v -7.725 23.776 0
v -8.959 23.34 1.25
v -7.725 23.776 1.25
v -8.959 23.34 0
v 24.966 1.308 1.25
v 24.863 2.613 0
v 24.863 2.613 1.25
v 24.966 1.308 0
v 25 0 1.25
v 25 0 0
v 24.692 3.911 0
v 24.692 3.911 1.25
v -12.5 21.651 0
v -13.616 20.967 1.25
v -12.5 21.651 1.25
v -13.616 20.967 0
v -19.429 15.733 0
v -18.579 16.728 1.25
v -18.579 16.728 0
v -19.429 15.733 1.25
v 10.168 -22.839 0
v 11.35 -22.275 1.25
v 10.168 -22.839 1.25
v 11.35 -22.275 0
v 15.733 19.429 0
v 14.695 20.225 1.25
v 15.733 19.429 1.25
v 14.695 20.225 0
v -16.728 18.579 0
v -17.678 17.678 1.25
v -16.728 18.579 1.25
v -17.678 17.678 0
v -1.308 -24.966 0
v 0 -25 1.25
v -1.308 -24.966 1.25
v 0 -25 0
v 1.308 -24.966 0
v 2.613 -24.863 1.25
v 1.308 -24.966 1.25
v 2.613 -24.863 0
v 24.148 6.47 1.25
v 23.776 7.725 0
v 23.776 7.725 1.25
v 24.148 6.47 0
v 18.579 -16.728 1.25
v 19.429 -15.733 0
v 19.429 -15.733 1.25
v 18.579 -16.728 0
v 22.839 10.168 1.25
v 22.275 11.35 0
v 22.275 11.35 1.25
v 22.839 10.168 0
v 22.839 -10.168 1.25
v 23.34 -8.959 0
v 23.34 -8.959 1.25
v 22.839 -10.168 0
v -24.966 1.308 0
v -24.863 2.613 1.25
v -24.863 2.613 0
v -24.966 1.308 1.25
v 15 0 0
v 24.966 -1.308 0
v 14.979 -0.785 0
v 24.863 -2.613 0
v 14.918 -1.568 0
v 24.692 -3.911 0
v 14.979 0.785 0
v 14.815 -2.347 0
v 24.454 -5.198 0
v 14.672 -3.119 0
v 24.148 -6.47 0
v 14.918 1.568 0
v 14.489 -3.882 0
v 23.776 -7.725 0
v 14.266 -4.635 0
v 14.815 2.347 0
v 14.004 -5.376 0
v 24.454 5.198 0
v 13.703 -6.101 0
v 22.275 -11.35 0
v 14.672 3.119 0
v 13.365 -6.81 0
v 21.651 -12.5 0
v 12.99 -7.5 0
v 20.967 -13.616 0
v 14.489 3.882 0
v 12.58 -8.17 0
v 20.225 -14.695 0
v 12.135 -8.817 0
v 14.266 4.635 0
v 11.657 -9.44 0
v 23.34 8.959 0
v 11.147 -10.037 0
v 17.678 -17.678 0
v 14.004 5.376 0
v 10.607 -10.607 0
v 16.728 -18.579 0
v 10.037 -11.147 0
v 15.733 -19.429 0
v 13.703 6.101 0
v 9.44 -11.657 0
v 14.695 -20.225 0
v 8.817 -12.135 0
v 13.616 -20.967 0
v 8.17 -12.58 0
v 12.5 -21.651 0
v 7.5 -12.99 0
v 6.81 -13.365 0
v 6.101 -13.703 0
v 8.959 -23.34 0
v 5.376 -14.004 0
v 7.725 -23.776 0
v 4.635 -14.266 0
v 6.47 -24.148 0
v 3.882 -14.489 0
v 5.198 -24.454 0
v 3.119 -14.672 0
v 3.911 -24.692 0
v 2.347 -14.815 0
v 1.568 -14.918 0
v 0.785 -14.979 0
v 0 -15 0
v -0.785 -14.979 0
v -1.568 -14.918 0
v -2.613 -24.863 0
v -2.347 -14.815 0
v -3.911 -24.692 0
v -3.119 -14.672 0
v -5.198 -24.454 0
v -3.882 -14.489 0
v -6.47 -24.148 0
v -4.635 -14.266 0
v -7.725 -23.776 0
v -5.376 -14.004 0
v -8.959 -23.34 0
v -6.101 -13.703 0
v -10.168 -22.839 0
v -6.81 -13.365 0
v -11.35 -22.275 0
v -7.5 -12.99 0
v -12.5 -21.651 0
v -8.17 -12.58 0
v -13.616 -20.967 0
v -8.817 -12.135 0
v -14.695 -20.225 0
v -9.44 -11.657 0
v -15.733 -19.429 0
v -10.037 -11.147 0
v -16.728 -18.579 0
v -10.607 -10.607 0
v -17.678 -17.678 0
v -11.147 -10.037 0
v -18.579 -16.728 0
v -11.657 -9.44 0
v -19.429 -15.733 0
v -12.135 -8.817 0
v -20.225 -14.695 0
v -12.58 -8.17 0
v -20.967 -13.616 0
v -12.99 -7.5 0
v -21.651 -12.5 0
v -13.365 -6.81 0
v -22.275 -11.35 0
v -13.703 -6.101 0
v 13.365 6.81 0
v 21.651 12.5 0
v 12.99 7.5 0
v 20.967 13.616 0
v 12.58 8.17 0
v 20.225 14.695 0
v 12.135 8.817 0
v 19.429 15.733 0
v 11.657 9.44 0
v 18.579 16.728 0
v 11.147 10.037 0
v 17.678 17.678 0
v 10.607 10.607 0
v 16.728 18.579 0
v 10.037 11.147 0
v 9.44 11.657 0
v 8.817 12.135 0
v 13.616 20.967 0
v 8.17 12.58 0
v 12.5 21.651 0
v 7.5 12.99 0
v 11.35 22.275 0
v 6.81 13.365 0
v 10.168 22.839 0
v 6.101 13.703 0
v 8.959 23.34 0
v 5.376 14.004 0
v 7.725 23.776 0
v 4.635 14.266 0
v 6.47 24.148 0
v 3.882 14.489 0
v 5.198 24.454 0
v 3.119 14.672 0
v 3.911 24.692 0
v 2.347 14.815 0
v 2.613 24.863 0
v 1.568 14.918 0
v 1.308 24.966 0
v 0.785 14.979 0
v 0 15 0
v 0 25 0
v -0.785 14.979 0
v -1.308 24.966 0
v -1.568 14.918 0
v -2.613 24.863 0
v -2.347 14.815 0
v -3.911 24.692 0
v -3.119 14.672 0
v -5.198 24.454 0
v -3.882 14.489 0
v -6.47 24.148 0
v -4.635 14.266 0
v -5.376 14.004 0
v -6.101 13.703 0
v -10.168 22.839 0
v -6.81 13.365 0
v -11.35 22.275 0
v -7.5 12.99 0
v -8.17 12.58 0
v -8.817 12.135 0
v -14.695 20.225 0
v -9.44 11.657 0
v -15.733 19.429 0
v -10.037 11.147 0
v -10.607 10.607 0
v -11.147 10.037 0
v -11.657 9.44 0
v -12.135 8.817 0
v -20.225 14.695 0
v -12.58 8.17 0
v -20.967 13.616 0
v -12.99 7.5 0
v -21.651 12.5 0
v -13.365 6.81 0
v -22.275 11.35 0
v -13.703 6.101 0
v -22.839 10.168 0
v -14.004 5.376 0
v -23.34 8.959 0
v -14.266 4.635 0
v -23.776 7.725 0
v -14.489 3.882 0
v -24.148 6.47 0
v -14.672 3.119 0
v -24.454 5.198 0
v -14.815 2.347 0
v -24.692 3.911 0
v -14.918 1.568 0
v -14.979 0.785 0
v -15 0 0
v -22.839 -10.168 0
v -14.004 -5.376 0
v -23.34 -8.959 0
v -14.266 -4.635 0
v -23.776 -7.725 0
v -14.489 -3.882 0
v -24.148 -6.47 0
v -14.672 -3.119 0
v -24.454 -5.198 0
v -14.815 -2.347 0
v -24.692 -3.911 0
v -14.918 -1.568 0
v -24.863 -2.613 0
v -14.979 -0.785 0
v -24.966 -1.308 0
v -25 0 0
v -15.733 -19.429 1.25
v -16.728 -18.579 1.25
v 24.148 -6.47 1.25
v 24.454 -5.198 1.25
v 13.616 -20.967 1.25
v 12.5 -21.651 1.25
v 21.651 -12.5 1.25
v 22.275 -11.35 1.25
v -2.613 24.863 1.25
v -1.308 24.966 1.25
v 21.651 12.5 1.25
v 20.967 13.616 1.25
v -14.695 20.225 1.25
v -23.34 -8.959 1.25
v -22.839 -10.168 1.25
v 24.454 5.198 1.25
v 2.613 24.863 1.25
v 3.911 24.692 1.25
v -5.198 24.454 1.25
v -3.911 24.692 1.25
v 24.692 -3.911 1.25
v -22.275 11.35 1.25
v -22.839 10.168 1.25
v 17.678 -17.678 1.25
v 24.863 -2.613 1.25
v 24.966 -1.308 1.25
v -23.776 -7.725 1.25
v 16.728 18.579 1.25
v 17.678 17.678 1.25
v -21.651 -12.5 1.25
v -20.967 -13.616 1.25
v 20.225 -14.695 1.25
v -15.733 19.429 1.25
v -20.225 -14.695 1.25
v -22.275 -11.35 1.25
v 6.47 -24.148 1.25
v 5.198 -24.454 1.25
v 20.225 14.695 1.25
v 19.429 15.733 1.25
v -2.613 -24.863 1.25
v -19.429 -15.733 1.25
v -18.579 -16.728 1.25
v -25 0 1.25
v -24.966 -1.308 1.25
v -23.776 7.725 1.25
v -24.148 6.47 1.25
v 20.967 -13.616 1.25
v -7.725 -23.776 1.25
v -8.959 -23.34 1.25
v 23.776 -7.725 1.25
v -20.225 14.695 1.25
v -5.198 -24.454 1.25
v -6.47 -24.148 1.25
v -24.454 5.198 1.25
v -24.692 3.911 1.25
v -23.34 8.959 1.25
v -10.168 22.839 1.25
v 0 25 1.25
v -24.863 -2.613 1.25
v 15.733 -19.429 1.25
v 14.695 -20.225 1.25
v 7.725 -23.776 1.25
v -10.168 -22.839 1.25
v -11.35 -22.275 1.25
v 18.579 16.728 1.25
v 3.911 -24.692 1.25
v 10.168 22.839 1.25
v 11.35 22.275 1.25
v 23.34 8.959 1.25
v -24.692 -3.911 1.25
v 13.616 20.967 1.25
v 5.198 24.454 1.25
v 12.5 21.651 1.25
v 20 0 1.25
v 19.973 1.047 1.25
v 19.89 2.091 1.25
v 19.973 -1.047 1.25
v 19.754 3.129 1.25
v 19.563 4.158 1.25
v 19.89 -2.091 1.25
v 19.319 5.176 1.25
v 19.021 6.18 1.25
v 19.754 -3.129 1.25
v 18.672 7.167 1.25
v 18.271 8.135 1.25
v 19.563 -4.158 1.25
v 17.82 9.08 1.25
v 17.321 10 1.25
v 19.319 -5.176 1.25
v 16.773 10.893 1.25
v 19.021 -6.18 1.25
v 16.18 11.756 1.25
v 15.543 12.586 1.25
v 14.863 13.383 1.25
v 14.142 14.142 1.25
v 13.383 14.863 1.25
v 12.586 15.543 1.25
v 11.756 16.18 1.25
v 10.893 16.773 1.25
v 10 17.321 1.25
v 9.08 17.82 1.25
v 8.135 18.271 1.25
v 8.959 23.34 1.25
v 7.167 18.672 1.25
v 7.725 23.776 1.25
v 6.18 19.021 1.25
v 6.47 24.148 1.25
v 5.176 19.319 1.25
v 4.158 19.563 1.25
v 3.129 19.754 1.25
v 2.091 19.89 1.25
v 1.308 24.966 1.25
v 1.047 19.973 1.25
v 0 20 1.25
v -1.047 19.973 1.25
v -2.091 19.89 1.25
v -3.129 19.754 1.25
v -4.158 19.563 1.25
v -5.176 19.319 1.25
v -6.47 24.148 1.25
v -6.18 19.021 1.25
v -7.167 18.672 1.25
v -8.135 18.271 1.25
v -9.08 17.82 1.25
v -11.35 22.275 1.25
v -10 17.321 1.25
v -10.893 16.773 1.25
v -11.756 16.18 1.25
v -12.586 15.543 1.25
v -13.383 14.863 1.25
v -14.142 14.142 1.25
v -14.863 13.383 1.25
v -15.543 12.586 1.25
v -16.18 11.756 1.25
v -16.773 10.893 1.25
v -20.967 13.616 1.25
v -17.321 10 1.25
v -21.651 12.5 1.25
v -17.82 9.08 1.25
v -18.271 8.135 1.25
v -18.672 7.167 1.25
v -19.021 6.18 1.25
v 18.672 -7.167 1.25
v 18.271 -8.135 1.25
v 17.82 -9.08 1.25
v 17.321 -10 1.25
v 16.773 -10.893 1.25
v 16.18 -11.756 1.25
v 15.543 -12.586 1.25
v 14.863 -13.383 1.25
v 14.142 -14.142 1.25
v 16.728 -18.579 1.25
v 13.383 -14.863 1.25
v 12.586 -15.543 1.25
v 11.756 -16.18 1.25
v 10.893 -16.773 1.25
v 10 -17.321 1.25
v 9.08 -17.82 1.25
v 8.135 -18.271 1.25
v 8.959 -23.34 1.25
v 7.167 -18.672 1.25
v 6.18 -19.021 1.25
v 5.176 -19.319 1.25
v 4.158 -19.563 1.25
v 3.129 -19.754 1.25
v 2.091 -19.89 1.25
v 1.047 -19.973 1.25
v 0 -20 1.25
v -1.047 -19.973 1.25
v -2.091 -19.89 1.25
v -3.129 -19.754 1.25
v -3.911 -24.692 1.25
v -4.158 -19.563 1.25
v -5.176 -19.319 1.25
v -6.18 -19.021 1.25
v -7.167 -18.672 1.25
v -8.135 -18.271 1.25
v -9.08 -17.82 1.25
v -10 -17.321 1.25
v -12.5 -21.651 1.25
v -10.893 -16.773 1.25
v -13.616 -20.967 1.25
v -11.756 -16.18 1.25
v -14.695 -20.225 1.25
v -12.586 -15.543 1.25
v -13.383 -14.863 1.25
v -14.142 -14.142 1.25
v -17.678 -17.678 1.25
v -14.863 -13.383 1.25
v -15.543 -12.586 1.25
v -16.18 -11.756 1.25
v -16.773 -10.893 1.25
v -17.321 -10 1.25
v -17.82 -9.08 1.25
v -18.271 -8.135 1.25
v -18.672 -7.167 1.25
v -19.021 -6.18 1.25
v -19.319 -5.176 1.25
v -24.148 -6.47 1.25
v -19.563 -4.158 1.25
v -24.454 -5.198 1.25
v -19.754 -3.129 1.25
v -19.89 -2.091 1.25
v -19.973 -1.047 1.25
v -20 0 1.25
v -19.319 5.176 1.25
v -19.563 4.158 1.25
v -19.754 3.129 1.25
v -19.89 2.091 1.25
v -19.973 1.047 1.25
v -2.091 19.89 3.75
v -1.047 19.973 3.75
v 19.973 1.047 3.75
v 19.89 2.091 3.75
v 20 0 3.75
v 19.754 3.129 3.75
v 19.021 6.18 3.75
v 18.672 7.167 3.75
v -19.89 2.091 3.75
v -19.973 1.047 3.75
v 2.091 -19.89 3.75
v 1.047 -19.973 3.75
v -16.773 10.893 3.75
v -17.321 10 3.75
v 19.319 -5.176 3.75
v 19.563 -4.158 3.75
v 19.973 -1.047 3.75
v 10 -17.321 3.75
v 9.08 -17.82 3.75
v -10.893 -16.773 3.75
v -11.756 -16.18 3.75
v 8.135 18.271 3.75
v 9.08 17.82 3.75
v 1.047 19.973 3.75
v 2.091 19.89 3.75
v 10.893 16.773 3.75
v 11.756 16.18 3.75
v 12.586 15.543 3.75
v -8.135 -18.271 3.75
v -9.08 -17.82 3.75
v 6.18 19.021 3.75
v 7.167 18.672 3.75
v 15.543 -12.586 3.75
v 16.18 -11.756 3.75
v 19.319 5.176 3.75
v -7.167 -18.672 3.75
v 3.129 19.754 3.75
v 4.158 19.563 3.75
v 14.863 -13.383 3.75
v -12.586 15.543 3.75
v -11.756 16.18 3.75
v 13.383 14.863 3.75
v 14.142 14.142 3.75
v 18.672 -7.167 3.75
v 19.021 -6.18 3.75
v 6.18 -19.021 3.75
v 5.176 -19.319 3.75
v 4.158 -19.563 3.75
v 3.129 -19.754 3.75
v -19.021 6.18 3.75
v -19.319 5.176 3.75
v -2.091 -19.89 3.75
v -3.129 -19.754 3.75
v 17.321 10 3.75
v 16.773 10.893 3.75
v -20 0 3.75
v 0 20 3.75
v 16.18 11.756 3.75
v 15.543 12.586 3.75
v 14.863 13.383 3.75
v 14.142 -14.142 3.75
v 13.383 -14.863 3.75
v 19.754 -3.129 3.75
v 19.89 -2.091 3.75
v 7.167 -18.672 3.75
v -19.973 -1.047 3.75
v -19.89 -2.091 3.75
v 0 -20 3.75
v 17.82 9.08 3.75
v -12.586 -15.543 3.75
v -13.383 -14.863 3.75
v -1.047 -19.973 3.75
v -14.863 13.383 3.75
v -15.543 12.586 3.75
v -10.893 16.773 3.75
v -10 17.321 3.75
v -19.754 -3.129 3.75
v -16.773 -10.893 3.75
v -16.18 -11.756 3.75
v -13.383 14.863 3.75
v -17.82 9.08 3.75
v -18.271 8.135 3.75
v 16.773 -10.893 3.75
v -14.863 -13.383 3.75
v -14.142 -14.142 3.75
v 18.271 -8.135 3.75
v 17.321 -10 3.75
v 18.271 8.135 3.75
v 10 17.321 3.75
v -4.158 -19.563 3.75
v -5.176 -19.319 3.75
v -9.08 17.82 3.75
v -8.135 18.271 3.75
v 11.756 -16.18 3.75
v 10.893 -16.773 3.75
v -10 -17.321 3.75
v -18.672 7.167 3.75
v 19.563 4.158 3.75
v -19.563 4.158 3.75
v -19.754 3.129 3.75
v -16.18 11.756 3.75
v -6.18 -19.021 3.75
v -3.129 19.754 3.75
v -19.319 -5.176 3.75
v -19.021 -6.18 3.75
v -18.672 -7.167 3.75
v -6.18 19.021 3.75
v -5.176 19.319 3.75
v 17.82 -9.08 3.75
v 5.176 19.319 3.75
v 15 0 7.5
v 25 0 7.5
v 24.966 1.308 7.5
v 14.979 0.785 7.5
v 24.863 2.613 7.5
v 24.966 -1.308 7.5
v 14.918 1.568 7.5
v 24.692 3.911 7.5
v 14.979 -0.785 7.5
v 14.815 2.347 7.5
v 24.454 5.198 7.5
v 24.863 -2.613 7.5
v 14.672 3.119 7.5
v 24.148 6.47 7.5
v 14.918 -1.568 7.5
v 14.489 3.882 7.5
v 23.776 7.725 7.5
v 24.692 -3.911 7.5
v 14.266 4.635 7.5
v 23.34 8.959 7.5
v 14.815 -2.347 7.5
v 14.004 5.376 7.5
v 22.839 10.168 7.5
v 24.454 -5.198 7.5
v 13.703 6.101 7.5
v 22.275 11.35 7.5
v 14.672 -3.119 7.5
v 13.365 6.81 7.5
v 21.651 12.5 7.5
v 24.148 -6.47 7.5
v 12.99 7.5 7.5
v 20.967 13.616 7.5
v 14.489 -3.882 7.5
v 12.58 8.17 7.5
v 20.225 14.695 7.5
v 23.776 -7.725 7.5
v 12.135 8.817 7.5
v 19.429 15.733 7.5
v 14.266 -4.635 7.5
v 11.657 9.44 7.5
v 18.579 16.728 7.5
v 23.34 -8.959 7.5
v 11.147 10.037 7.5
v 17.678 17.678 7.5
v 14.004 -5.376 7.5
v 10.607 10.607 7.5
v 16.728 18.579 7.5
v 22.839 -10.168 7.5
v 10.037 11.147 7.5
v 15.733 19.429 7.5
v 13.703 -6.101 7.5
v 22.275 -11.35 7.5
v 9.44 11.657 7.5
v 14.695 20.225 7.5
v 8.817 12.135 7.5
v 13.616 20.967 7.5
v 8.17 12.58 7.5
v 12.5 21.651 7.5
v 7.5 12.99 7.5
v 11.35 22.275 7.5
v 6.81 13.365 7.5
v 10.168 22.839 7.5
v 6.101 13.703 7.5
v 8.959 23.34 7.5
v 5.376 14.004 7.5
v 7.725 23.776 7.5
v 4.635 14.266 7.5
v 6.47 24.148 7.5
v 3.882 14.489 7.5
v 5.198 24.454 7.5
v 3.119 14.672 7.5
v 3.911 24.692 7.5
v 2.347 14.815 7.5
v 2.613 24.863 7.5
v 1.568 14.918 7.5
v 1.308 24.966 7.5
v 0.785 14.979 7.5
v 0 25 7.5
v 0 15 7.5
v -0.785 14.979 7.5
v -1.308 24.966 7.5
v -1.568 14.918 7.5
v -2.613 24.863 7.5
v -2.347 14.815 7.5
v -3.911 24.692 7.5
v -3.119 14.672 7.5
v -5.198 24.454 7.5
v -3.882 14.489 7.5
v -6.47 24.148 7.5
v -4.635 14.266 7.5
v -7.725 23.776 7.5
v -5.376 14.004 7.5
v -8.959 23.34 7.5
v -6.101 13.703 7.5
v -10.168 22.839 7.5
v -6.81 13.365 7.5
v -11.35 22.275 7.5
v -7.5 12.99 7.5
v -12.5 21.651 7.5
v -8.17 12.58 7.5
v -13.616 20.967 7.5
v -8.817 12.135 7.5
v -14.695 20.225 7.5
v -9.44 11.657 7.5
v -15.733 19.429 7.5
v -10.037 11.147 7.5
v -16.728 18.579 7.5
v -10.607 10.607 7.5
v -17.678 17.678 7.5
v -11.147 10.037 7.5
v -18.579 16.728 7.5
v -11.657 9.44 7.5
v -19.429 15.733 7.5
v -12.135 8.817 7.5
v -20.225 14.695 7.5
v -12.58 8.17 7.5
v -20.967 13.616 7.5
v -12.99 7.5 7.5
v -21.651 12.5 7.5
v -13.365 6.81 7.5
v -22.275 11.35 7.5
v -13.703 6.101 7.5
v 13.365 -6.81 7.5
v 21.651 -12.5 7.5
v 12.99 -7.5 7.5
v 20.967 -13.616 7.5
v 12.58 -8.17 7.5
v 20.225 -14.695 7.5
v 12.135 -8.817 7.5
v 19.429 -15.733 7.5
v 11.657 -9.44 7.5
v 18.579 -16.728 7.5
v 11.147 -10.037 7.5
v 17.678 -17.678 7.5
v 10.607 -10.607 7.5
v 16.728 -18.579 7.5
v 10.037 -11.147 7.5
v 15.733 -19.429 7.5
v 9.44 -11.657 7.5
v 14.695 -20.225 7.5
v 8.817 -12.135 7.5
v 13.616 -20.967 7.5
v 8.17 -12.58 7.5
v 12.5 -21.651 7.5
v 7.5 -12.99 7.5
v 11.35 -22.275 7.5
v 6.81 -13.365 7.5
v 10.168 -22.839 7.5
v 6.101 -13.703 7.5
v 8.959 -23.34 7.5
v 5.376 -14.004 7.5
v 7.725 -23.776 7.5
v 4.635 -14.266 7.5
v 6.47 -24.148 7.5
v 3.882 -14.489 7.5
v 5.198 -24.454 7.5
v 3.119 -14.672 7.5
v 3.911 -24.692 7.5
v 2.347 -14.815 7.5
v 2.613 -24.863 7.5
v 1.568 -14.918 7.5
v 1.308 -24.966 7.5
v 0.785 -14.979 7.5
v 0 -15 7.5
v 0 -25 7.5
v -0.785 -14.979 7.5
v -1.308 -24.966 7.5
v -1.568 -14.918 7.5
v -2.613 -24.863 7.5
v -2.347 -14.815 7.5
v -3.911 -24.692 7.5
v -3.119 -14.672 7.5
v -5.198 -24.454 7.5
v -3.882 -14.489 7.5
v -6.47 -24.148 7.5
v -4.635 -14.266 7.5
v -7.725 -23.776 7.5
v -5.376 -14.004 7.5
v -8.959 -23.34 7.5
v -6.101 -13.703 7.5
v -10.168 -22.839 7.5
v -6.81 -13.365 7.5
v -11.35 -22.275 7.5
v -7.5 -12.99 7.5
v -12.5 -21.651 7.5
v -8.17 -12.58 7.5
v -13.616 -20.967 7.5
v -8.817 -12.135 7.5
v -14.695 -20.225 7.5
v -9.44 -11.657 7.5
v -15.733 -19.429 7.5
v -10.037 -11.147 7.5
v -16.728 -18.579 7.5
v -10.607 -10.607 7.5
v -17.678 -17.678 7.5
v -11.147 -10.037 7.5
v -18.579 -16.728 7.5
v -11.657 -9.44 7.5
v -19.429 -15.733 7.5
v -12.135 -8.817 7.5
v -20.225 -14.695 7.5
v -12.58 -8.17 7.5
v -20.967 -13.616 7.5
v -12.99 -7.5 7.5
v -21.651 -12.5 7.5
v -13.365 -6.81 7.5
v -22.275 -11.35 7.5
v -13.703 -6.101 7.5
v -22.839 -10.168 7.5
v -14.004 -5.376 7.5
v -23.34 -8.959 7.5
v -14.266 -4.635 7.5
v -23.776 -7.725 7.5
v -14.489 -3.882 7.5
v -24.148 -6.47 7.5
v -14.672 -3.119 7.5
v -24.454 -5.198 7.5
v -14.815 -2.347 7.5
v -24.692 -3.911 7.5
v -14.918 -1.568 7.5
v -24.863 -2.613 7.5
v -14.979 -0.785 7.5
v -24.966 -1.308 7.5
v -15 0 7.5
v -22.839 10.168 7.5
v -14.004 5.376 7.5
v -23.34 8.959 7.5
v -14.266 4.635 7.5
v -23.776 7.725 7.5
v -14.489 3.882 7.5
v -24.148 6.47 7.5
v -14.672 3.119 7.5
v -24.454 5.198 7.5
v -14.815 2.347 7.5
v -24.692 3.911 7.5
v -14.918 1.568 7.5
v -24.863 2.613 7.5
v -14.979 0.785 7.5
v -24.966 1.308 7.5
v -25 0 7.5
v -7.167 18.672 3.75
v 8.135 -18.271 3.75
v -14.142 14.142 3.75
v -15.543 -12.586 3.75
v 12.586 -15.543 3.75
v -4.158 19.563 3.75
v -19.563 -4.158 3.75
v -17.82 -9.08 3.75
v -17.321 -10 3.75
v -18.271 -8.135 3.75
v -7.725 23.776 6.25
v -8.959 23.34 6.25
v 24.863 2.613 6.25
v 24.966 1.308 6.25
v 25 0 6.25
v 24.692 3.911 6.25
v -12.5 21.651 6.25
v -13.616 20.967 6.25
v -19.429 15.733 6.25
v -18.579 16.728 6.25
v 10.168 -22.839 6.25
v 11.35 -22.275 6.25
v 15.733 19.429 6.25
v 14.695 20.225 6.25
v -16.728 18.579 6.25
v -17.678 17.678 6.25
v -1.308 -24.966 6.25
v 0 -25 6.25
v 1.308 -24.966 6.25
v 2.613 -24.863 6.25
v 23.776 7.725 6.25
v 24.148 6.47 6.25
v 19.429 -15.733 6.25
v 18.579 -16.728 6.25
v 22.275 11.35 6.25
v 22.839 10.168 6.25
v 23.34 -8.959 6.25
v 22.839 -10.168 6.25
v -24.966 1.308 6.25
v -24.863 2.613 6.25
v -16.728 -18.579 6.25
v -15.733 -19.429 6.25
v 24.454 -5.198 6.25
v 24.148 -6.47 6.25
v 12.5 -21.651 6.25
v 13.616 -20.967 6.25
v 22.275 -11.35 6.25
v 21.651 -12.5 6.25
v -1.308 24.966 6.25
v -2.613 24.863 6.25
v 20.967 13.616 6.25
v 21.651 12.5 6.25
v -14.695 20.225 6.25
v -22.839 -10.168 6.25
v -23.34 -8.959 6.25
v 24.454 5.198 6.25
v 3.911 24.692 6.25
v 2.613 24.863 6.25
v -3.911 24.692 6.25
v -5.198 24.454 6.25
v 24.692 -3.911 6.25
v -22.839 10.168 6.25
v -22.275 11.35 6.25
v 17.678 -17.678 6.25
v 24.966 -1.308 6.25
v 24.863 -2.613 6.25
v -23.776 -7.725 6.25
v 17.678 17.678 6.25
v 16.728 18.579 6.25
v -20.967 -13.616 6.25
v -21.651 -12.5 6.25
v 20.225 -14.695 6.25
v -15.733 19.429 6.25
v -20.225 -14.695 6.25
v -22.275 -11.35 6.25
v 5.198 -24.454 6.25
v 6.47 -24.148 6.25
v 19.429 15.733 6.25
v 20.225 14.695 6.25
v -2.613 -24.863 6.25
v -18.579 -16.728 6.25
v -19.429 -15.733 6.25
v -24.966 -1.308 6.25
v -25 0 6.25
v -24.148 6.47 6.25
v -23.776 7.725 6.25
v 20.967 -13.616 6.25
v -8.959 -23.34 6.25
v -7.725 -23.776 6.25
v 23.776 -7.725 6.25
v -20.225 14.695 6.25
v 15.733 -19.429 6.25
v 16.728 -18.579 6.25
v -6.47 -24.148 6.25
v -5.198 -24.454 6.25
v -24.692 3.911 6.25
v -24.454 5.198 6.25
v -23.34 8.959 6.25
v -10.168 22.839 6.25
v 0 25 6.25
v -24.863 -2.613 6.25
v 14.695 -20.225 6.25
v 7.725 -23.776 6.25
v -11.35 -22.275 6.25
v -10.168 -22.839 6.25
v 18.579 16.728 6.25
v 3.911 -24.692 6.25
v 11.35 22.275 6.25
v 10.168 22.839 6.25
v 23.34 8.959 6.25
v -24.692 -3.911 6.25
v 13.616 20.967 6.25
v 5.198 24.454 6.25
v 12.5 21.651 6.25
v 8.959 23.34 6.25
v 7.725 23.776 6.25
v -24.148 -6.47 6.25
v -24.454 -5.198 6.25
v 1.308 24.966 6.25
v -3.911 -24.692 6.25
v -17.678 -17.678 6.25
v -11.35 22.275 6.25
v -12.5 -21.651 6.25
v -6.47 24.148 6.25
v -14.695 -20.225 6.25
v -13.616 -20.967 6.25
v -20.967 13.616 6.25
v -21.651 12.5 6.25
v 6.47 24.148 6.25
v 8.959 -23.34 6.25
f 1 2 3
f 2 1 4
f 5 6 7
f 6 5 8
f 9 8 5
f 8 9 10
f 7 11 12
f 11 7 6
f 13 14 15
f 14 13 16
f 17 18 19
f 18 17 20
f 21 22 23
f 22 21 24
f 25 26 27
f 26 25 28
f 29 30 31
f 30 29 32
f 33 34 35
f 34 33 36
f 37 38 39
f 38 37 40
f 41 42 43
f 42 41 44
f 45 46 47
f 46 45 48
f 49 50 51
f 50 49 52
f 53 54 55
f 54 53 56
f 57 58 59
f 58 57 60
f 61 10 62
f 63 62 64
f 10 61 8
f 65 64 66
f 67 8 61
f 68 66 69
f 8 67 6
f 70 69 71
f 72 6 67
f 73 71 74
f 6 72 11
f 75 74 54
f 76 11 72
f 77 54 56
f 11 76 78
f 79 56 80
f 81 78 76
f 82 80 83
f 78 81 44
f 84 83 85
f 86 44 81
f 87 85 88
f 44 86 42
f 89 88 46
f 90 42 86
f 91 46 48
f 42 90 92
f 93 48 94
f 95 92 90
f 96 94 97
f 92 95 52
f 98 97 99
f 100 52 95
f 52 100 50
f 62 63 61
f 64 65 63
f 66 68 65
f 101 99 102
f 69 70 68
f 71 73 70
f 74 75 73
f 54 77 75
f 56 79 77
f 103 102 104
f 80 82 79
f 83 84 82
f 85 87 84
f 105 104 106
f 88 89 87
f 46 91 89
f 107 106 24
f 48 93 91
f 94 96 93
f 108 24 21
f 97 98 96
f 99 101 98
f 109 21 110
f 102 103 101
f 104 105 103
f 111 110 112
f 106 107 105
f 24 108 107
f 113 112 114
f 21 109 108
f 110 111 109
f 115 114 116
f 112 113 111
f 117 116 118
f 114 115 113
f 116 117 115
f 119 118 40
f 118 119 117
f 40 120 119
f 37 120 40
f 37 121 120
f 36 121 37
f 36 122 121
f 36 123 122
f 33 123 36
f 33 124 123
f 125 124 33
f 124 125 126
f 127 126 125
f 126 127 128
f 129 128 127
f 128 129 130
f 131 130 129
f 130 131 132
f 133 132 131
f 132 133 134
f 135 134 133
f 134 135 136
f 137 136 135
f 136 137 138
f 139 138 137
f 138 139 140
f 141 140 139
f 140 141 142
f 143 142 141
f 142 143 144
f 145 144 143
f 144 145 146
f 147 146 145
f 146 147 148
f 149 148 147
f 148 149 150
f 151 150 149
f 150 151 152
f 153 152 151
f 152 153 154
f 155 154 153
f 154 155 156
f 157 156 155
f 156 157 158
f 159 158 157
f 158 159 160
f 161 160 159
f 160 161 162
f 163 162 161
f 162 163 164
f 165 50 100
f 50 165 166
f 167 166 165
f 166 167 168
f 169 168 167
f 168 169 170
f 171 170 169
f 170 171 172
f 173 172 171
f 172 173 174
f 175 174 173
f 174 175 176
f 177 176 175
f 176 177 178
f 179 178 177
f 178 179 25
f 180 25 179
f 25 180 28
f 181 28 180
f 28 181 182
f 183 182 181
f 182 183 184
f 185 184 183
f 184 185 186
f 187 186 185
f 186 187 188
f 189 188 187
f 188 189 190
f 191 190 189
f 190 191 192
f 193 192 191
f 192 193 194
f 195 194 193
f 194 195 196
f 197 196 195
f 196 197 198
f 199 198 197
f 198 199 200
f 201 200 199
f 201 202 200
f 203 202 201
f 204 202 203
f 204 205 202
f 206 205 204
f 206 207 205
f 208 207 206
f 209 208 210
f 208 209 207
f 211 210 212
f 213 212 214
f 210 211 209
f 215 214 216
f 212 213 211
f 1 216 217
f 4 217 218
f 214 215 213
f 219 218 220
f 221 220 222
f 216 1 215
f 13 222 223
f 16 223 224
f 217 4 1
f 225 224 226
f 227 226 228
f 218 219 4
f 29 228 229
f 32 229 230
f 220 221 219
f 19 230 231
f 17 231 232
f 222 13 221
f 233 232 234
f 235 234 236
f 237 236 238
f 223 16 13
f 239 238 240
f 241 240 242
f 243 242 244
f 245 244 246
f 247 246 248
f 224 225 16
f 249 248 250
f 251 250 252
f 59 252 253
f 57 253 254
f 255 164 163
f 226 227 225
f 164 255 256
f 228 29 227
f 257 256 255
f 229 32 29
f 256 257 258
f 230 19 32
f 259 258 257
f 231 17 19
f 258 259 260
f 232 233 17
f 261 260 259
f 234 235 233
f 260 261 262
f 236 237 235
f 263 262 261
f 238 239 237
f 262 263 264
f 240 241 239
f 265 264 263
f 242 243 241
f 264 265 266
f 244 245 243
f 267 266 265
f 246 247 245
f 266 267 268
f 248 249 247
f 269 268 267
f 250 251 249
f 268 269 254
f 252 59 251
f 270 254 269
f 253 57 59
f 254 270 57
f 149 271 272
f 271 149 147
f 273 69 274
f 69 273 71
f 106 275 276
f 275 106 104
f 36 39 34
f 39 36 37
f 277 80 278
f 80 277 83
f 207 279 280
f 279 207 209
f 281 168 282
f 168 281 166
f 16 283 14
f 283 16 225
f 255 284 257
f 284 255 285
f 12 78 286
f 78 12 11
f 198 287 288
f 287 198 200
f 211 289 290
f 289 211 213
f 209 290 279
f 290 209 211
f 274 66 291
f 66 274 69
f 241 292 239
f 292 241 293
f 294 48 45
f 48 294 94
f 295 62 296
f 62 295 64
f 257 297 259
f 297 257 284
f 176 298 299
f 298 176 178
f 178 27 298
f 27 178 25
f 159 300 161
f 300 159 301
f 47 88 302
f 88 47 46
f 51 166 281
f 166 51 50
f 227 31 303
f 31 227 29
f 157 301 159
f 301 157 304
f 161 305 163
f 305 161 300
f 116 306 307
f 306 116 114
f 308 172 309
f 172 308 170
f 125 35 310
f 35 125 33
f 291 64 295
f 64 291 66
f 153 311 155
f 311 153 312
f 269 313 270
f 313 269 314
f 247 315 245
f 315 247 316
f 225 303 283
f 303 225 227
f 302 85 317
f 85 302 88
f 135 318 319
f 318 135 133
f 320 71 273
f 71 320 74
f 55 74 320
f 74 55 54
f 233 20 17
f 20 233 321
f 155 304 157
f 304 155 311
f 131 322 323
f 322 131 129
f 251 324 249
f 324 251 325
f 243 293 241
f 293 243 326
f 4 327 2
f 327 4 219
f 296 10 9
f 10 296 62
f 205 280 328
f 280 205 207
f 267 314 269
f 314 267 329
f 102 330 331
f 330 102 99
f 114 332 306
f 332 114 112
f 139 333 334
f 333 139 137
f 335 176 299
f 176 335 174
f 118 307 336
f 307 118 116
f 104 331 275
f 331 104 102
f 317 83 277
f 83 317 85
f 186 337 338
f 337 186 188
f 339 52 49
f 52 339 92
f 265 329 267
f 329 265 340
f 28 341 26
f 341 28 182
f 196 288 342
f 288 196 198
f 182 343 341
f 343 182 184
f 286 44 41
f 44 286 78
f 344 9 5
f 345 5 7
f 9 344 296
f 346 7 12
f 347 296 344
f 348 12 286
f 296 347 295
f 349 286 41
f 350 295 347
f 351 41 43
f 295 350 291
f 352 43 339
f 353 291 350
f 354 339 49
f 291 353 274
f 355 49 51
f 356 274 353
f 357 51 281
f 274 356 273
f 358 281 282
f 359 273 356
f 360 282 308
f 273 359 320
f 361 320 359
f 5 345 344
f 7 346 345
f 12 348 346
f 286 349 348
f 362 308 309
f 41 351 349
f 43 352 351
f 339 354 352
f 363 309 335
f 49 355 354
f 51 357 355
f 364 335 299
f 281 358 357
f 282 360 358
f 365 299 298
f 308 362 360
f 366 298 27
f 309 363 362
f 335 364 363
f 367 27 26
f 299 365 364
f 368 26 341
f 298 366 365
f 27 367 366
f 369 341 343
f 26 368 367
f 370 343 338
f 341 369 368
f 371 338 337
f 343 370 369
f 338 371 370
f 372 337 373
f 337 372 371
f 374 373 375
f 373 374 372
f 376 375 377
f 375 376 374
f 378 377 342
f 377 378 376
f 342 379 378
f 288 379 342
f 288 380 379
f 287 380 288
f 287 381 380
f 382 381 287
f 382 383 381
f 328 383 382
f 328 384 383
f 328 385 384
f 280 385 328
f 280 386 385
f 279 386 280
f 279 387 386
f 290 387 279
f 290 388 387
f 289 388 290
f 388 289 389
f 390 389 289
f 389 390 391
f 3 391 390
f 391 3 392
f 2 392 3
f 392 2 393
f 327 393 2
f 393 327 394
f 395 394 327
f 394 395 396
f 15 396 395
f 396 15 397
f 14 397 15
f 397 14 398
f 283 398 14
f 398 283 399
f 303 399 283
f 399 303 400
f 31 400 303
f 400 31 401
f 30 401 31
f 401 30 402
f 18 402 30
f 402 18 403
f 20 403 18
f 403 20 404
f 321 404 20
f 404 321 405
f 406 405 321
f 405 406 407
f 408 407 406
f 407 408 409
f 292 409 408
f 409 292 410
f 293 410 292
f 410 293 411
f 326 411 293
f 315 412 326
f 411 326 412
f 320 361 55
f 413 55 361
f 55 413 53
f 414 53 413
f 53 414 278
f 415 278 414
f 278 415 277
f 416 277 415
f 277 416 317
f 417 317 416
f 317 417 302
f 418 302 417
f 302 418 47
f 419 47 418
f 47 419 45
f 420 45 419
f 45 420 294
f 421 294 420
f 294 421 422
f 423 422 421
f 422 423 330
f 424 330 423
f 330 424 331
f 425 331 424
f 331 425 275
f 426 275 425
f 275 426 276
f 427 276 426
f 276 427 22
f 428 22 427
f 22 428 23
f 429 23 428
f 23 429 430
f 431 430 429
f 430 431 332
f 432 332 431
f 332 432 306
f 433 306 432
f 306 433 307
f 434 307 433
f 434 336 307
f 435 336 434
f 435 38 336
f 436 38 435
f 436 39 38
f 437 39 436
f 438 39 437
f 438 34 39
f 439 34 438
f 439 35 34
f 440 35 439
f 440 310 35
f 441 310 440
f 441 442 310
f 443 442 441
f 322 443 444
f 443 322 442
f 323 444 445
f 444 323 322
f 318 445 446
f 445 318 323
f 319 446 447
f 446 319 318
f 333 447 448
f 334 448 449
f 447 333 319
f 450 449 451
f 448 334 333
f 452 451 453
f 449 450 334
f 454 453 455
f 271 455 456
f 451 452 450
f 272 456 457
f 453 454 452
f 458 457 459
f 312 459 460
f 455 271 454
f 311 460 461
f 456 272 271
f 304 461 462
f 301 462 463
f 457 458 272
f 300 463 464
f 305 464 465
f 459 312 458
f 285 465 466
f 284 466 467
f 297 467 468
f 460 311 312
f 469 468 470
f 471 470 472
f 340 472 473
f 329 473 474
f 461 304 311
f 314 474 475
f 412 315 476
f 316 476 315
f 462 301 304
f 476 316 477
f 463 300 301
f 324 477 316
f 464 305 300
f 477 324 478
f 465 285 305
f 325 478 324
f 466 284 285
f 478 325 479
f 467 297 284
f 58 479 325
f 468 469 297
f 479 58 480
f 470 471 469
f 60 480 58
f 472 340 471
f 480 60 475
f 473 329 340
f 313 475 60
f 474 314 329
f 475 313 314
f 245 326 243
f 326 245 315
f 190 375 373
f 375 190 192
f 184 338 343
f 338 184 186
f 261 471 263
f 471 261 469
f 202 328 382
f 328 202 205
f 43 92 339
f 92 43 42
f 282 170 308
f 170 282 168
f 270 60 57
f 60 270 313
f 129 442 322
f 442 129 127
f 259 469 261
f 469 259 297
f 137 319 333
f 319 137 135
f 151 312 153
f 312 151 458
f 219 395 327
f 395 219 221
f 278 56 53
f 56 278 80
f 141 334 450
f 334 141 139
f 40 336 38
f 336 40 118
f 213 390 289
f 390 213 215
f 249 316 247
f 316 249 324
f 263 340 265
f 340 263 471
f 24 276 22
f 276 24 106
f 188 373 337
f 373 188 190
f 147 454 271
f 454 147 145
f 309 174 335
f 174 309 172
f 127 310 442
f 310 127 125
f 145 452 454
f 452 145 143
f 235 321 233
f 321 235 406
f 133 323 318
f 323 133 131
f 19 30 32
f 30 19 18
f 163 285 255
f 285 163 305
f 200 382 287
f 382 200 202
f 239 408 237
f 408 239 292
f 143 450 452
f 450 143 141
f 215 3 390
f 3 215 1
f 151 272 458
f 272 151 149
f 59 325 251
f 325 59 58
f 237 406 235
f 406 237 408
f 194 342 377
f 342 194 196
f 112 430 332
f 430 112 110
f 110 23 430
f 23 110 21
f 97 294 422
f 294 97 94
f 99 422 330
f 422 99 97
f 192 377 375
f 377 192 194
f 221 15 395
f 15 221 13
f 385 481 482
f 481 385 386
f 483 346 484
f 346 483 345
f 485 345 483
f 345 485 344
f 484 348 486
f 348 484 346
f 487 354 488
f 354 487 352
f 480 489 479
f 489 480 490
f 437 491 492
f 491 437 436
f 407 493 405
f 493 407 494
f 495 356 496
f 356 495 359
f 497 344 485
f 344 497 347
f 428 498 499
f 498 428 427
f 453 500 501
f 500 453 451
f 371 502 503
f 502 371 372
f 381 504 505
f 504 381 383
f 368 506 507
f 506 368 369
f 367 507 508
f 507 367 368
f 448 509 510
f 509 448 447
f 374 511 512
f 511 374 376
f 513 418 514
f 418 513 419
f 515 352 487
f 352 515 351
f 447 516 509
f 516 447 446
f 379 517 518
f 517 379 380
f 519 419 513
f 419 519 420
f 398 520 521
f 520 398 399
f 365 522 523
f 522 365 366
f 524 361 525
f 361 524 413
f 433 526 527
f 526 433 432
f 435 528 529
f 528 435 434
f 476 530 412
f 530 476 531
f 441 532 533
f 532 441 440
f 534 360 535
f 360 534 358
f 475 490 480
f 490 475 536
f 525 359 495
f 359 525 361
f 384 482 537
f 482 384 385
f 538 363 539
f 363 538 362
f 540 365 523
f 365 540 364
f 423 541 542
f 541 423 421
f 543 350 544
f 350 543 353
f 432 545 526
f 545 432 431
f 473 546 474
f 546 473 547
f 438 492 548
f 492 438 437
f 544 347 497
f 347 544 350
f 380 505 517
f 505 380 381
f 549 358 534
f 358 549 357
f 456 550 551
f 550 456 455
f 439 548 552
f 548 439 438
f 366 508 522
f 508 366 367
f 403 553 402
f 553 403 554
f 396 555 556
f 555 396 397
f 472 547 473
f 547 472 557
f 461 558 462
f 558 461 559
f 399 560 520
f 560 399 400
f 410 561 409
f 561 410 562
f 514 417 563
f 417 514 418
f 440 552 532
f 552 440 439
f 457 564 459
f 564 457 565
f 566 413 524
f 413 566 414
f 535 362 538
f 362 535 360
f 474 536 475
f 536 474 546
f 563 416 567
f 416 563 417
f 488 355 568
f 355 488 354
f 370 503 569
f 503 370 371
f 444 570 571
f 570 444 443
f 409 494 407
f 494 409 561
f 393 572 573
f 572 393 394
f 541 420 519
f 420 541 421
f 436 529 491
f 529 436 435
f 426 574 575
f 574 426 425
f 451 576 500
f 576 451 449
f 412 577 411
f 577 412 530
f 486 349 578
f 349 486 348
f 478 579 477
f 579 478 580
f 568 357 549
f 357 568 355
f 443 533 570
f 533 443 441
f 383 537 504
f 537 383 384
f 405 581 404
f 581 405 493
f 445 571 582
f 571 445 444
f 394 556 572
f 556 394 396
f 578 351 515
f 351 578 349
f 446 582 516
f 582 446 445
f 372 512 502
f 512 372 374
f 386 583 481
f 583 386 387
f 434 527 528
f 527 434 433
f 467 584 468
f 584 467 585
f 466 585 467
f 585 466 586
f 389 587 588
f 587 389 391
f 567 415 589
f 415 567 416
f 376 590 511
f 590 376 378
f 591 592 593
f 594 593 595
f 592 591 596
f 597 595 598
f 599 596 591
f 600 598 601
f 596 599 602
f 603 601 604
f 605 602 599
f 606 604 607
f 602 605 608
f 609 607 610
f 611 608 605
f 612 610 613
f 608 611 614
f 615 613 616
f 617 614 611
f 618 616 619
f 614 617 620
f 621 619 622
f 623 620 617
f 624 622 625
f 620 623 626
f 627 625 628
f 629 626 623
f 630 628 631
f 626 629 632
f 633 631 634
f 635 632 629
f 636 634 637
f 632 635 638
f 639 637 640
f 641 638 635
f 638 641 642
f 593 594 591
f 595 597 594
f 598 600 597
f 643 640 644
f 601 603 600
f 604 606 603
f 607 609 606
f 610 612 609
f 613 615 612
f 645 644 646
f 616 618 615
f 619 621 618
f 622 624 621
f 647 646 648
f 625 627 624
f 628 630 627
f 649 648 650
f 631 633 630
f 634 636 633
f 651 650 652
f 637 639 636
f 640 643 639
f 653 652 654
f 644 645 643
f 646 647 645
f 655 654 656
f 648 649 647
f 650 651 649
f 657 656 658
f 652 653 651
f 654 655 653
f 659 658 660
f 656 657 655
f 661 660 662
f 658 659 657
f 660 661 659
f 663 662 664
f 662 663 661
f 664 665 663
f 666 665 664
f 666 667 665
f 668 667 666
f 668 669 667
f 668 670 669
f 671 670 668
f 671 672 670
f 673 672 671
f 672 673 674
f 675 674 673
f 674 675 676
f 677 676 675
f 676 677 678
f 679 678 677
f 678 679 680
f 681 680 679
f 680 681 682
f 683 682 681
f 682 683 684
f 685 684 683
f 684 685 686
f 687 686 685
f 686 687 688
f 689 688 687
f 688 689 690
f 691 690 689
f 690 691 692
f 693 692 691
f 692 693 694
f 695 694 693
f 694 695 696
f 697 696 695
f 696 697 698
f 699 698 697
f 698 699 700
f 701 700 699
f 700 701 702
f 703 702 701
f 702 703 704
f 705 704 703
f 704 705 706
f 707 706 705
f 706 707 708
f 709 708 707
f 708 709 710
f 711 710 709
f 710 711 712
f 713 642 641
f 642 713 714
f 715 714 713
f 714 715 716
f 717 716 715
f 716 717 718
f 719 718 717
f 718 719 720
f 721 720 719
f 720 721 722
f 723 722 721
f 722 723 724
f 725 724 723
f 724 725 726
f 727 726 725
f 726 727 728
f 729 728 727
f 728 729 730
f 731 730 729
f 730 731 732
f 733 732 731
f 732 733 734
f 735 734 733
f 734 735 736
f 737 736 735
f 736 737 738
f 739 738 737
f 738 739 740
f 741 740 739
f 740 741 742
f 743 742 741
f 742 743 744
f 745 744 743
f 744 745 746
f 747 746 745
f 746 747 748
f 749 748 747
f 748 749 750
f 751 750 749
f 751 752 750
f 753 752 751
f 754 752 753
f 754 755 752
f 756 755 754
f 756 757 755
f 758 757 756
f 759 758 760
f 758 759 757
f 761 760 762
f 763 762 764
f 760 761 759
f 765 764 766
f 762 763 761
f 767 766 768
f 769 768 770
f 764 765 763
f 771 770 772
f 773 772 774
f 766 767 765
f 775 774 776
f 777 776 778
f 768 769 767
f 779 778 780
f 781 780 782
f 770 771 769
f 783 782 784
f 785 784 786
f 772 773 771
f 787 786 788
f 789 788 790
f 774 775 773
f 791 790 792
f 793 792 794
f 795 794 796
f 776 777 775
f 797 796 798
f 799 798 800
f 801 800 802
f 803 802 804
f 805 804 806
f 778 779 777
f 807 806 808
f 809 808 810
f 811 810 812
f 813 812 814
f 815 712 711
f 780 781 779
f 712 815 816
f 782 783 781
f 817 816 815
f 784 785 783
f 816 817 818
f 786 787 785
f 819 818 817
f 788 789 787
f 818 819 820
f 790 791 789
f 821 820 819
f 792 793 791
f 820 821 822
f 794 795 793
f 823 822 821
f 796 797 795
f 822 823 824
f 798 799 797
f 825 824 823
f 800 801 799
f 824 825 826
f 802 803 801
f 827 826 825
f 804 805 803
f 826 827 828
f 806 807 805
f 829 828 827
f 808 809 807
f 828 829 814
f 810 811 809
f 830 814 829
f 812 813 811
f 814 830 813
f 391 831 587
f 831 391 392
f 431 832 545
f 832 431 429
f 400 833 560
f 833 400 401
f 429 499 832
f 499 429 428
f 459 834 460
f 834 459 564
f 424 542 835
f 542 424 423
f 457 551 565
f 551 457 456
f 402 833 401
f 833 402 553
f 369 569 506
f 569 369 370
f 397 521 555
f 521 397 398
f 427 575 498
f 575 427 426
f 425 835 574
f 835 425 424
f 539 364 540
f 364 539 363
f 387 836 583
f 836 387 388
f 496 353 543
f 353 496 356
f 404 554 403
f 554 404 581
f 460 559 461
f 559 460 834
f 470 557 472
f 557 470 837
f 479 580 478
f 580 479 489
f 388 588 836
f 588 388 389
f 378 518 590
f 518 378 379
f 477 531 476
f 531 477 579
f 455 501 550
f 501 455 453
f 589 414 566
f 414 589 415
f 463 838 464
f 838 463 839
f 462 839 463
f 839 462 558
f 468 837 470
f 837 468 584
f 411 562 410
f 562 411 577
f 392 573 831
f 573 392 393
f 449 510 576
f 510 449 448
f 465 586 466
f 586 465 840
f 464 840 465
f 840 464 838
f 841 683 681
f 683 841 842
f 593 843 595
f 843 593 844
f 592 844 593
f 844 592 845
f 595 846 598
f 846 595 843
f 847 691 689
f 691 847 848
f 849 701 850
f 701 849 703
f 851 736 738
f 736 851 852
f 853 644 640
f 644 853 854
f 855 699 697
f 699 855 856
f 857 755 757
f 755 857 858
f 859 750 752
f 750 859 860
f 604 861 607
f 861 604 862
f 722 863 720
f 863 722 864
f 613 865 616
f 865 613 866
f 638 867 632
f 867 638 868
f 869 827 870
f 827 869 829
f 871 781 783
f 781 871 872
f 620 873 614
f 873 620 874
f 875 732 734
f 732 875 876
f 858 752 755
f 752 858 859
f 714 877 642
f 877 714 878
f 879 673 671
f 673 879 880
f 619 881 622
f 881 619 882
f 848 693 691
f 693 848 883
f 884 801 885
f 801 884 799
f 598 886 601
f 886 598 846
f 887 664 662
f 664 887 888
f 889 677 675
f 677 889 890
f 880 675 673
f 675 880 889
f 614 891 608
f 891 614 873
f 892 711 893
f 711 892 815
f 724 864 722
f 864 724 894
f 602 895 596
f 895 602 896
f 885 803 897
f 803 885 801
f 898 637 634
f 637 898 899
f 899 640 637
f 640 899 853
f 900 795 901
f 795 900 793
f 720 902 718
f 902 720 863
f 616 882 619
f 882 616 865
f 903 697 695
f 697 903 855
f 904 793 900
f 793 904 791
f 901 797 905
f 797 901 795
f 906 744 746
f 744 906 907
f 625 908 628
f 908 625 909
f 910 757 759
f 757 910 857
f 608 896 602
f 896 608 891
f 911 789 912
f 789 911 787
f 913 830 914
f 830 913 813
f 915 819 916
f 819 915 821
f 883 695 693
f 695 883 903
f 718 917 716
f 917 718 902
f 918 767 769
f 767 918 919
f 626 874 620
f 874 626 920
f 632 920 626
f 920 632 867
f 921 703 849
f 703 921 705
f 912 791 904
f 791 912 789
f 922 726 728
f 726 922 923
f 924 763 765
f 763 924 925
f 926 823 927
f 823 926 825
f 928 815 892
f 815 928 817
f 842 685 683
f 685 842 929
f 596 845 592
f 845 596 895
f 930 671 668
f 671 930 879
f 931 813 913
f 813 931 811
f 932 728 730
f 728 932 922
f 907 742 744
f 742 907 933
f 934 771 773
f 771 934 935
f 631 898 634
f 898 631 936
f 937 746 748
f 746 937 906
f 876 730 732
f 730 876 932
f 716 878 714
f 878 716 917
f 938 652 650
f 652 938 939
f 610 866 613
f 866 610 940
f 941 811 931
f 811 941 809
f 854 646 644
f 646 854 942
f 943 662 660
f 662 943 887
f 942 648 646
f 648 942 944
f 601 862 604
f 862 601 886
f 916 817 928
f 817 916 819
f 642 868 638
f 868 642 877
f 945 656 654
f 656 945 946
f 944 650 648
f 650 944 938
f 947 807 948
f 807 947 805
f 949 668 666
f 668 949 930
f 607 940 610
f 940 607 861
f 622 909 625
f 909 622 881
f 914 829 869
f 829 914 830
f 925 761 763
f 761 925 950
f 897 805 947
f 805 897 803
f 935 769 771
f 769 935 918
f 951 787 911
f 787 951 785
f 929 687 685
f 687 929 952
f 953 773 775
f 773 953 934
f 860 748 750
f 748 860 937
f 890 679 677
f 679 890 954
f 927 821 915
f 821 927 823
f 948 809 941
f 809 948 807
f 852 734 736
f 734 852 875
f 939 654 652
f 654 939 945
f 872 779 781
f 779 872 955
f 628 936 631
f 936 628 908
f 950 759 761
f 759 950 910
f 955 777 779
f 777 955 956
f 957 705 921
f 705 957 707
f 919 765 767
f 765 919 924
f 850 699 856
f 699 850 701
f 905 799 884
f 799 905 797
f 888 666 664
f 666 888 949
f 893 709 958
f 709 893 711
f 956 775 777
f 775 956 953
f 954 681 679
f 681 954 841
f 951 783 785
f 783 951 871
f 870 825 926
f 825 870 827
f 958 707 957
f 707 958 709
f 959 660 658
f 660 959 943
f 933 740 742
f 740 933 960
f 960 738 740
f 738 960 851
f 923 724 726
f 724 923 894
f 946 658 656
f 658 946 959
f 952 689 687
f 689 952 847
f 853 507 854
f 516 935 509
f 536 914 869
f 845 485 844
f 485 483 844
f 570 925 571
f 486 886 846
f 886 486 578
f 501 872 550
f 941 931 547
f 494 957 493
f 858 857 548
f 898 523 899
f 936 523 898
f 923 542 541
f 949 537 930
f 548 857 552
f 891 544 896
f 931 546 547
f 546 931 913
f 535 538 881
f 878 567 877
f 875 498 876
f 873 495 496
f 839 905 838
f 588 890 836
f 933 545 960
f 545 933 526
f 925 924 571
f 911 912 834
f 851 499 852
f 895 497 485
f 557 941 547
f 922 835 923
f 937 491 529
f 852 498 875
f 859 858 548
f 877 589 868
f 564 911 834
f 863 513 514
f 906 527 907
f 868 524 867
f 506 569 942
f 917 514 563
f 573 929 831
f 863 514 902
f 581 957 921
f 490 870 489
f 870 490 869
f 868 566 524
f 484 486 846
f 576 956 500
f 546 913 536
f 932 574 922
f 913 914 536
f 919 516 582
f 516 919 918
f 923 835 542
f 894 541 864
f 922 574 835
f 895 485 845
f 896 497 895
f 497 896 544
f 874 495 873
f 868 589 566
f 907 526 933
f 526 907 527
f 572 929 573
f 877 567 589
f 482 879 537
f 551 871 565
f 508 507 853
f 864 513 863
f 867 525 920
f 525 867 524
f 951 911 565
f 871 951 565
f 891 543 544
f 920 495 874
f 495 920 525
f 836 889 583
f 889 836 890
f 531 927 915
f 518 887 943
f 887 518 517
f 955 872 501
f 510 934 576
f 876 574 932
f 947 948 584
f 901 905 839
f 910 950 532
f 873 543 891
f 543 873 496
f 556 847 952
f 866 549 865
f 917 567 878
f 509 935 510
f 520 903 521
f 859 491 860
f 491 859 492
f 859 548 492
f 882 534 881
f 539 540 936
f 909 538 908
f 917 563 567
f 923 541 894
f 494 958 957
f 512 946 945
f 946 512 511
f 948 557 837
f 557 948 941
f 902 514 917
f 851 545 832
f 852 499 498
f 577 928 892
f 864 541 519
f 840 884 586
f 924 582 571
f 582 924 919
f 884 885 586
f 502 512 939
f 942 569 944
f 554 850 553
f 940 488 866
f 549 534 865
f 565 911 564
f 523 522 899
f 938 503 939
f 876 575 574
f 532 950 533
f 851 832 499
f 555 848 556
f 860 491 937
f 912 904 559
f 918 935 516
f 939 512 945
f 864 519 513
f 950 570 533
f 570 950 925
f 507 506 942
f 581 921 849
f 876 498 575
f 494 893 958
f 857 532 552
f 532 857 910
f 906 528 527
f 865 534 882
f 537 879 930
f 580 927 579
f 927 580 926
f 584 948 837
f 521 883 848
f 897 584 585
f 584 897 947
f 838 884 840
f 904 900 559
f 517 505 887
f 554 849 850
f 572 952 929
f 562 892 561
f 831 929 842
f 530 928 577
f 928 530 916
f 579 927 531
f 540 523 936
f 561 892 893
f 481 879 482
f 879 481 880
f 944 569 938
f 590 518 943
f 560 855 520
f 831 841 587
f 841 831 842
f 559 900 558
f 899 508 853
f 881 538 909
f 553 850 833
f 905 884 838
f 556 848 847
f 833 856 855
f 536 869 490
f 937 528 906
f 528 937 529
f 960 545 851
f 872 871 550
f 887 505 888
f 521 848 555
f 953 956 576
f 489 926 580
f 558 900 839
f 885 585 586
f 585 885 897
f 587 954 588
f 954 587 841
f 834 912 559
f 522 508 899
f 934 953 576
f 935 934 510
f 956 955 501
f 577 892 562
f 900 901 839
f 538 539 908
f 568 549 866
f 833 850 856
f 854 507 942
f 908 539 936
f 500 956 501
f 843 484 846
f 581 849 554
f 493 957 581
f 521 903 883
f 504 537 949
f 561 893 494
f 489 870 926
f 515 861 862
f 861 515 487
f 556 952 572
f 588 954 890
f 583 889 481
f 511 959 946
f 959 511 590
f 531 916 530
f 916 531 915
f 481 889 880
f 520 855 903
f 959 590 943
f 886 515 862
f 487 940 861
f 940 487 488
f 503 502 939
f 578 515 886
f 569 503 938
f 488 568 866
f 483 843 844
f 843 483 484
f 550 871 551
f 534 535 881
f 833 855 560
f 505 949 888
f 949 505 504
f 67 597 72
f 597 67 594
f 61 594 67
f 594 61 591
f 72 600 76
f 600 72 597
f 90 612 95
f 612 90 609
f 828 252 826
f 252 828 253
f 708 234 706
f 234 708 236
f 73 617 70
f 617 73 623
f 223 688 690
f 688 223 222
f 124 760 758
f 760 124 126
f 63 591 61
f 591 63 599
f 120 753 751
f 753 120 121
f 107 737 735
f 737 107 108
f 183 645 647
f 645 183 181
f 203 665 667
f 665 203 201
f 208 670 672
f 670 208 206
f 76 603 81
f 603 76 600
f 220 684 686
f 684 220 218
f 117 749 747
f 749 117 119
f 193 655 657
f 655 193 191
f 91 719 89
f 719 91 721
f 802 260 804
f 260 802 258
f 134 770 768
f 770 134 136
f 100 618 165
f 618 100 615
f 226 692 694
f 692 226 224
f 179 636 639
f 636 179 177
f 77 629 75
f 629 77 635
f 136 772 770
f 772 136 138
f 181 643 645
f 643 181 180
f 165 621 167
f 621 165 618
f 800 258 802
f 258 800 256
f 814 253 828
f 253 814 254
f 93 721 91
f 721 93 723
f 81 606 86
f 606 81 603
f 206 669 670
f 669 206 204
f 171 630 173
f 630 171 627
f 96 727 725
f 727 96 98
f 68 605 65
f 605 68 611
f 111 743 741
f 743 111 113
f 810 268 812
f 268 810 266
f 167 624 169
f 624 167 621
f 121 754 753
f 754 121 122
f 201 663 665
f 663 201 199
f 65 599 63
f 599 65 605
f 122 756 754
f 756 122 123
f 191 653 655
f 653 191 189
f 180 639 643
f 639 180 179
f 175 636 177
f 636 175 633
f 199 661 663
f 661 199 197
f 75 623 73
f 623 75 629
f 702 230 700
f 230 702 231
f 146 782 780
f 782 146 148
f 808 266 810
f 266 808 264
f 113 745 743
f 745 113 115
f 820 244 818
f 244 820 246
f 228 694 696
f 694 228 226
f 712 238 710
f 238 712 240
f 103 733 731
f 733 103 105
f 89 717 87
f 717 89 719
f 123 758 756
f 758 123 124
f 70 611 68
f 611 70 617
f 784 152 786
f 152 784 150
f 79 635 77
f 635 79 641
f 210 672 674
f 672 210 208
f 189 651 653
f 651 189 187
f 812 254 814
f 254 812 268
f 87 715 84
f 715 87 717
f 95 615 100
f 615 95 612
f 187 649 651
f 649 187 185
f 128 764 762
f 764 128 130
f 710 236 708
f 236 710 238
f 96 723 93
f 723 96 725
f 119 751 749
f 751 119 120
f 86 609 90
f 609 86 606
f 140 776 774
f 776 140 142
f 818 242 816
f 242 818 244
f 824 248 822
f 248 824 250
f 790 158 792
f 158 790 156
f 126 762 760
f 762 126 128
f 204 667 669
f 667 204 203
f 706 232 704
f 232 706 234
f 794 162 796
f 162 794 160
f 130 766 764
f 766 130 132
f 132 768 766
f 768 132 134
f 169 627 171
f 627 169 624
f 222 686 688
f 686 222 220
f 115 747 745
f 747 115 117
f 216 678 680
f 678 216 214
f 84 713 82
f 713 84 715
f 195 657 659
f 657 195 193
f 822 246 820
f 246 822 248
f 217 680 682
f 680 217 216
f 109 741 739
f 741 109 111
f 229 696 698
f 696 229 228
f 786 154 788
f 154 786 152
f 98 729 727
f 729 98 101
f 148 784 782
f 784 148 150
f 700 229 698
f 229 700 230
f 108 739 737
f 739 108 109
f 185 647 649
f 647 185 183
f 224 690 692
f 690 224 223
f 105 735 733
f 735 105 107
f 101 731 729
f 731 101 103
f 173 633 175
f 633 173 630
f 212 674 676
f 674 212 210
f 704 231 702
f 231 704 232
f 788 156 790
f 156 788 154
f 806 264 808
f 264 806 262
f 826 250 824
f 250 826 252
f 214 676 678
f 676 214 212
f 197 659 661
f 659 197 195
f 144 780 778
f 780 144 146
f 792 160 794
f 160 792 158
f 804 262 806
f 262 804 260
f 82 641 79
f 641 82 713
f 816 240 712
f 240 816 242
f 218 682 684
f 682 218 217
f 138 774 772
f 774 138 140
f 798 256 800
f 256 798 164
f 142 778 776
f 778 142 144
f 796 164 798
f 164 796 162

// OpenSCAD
//variables (mm)
	idlerID = 30; //Inner Dia
	idlerOD = 40; //Outer Dia
	beltwidth= 2.5; //Belt Width
	$fn=120; //faceting

//these are the lips that hold the belt on
	lipheight = 5; //Lip Height
	lipthickness = 1.25; //Lip Thickness
	topangle = 60; //The angle the top lip overhang makes. You can increase this to lower the idler profile.

//construction
	difference(){
	union(){
		cylinder(r=lipheight+idlerOD/2, h=lipthickness);
		cylinder(r=idlerOD/2, h = lipthickness*2+beltwidth+lipheight*cos(topangle));
		translate([0,0,lipthickness+beltwidth+lipheight*cos(topangle)])cylinder(r=lipheight+idlerOD/2, h=lipthickness);
		translate([0,0,beltwidth+lipthickness])cylinder(r1=idlerOD/2, r2=lipheight+idlerOD/2, h=lipheight*cos(topangle));
		}
		translate([0,0,-1])cylinder(r=idlerID/2, h=lipthickness*2+beltwidth+lipheight*2);
}
